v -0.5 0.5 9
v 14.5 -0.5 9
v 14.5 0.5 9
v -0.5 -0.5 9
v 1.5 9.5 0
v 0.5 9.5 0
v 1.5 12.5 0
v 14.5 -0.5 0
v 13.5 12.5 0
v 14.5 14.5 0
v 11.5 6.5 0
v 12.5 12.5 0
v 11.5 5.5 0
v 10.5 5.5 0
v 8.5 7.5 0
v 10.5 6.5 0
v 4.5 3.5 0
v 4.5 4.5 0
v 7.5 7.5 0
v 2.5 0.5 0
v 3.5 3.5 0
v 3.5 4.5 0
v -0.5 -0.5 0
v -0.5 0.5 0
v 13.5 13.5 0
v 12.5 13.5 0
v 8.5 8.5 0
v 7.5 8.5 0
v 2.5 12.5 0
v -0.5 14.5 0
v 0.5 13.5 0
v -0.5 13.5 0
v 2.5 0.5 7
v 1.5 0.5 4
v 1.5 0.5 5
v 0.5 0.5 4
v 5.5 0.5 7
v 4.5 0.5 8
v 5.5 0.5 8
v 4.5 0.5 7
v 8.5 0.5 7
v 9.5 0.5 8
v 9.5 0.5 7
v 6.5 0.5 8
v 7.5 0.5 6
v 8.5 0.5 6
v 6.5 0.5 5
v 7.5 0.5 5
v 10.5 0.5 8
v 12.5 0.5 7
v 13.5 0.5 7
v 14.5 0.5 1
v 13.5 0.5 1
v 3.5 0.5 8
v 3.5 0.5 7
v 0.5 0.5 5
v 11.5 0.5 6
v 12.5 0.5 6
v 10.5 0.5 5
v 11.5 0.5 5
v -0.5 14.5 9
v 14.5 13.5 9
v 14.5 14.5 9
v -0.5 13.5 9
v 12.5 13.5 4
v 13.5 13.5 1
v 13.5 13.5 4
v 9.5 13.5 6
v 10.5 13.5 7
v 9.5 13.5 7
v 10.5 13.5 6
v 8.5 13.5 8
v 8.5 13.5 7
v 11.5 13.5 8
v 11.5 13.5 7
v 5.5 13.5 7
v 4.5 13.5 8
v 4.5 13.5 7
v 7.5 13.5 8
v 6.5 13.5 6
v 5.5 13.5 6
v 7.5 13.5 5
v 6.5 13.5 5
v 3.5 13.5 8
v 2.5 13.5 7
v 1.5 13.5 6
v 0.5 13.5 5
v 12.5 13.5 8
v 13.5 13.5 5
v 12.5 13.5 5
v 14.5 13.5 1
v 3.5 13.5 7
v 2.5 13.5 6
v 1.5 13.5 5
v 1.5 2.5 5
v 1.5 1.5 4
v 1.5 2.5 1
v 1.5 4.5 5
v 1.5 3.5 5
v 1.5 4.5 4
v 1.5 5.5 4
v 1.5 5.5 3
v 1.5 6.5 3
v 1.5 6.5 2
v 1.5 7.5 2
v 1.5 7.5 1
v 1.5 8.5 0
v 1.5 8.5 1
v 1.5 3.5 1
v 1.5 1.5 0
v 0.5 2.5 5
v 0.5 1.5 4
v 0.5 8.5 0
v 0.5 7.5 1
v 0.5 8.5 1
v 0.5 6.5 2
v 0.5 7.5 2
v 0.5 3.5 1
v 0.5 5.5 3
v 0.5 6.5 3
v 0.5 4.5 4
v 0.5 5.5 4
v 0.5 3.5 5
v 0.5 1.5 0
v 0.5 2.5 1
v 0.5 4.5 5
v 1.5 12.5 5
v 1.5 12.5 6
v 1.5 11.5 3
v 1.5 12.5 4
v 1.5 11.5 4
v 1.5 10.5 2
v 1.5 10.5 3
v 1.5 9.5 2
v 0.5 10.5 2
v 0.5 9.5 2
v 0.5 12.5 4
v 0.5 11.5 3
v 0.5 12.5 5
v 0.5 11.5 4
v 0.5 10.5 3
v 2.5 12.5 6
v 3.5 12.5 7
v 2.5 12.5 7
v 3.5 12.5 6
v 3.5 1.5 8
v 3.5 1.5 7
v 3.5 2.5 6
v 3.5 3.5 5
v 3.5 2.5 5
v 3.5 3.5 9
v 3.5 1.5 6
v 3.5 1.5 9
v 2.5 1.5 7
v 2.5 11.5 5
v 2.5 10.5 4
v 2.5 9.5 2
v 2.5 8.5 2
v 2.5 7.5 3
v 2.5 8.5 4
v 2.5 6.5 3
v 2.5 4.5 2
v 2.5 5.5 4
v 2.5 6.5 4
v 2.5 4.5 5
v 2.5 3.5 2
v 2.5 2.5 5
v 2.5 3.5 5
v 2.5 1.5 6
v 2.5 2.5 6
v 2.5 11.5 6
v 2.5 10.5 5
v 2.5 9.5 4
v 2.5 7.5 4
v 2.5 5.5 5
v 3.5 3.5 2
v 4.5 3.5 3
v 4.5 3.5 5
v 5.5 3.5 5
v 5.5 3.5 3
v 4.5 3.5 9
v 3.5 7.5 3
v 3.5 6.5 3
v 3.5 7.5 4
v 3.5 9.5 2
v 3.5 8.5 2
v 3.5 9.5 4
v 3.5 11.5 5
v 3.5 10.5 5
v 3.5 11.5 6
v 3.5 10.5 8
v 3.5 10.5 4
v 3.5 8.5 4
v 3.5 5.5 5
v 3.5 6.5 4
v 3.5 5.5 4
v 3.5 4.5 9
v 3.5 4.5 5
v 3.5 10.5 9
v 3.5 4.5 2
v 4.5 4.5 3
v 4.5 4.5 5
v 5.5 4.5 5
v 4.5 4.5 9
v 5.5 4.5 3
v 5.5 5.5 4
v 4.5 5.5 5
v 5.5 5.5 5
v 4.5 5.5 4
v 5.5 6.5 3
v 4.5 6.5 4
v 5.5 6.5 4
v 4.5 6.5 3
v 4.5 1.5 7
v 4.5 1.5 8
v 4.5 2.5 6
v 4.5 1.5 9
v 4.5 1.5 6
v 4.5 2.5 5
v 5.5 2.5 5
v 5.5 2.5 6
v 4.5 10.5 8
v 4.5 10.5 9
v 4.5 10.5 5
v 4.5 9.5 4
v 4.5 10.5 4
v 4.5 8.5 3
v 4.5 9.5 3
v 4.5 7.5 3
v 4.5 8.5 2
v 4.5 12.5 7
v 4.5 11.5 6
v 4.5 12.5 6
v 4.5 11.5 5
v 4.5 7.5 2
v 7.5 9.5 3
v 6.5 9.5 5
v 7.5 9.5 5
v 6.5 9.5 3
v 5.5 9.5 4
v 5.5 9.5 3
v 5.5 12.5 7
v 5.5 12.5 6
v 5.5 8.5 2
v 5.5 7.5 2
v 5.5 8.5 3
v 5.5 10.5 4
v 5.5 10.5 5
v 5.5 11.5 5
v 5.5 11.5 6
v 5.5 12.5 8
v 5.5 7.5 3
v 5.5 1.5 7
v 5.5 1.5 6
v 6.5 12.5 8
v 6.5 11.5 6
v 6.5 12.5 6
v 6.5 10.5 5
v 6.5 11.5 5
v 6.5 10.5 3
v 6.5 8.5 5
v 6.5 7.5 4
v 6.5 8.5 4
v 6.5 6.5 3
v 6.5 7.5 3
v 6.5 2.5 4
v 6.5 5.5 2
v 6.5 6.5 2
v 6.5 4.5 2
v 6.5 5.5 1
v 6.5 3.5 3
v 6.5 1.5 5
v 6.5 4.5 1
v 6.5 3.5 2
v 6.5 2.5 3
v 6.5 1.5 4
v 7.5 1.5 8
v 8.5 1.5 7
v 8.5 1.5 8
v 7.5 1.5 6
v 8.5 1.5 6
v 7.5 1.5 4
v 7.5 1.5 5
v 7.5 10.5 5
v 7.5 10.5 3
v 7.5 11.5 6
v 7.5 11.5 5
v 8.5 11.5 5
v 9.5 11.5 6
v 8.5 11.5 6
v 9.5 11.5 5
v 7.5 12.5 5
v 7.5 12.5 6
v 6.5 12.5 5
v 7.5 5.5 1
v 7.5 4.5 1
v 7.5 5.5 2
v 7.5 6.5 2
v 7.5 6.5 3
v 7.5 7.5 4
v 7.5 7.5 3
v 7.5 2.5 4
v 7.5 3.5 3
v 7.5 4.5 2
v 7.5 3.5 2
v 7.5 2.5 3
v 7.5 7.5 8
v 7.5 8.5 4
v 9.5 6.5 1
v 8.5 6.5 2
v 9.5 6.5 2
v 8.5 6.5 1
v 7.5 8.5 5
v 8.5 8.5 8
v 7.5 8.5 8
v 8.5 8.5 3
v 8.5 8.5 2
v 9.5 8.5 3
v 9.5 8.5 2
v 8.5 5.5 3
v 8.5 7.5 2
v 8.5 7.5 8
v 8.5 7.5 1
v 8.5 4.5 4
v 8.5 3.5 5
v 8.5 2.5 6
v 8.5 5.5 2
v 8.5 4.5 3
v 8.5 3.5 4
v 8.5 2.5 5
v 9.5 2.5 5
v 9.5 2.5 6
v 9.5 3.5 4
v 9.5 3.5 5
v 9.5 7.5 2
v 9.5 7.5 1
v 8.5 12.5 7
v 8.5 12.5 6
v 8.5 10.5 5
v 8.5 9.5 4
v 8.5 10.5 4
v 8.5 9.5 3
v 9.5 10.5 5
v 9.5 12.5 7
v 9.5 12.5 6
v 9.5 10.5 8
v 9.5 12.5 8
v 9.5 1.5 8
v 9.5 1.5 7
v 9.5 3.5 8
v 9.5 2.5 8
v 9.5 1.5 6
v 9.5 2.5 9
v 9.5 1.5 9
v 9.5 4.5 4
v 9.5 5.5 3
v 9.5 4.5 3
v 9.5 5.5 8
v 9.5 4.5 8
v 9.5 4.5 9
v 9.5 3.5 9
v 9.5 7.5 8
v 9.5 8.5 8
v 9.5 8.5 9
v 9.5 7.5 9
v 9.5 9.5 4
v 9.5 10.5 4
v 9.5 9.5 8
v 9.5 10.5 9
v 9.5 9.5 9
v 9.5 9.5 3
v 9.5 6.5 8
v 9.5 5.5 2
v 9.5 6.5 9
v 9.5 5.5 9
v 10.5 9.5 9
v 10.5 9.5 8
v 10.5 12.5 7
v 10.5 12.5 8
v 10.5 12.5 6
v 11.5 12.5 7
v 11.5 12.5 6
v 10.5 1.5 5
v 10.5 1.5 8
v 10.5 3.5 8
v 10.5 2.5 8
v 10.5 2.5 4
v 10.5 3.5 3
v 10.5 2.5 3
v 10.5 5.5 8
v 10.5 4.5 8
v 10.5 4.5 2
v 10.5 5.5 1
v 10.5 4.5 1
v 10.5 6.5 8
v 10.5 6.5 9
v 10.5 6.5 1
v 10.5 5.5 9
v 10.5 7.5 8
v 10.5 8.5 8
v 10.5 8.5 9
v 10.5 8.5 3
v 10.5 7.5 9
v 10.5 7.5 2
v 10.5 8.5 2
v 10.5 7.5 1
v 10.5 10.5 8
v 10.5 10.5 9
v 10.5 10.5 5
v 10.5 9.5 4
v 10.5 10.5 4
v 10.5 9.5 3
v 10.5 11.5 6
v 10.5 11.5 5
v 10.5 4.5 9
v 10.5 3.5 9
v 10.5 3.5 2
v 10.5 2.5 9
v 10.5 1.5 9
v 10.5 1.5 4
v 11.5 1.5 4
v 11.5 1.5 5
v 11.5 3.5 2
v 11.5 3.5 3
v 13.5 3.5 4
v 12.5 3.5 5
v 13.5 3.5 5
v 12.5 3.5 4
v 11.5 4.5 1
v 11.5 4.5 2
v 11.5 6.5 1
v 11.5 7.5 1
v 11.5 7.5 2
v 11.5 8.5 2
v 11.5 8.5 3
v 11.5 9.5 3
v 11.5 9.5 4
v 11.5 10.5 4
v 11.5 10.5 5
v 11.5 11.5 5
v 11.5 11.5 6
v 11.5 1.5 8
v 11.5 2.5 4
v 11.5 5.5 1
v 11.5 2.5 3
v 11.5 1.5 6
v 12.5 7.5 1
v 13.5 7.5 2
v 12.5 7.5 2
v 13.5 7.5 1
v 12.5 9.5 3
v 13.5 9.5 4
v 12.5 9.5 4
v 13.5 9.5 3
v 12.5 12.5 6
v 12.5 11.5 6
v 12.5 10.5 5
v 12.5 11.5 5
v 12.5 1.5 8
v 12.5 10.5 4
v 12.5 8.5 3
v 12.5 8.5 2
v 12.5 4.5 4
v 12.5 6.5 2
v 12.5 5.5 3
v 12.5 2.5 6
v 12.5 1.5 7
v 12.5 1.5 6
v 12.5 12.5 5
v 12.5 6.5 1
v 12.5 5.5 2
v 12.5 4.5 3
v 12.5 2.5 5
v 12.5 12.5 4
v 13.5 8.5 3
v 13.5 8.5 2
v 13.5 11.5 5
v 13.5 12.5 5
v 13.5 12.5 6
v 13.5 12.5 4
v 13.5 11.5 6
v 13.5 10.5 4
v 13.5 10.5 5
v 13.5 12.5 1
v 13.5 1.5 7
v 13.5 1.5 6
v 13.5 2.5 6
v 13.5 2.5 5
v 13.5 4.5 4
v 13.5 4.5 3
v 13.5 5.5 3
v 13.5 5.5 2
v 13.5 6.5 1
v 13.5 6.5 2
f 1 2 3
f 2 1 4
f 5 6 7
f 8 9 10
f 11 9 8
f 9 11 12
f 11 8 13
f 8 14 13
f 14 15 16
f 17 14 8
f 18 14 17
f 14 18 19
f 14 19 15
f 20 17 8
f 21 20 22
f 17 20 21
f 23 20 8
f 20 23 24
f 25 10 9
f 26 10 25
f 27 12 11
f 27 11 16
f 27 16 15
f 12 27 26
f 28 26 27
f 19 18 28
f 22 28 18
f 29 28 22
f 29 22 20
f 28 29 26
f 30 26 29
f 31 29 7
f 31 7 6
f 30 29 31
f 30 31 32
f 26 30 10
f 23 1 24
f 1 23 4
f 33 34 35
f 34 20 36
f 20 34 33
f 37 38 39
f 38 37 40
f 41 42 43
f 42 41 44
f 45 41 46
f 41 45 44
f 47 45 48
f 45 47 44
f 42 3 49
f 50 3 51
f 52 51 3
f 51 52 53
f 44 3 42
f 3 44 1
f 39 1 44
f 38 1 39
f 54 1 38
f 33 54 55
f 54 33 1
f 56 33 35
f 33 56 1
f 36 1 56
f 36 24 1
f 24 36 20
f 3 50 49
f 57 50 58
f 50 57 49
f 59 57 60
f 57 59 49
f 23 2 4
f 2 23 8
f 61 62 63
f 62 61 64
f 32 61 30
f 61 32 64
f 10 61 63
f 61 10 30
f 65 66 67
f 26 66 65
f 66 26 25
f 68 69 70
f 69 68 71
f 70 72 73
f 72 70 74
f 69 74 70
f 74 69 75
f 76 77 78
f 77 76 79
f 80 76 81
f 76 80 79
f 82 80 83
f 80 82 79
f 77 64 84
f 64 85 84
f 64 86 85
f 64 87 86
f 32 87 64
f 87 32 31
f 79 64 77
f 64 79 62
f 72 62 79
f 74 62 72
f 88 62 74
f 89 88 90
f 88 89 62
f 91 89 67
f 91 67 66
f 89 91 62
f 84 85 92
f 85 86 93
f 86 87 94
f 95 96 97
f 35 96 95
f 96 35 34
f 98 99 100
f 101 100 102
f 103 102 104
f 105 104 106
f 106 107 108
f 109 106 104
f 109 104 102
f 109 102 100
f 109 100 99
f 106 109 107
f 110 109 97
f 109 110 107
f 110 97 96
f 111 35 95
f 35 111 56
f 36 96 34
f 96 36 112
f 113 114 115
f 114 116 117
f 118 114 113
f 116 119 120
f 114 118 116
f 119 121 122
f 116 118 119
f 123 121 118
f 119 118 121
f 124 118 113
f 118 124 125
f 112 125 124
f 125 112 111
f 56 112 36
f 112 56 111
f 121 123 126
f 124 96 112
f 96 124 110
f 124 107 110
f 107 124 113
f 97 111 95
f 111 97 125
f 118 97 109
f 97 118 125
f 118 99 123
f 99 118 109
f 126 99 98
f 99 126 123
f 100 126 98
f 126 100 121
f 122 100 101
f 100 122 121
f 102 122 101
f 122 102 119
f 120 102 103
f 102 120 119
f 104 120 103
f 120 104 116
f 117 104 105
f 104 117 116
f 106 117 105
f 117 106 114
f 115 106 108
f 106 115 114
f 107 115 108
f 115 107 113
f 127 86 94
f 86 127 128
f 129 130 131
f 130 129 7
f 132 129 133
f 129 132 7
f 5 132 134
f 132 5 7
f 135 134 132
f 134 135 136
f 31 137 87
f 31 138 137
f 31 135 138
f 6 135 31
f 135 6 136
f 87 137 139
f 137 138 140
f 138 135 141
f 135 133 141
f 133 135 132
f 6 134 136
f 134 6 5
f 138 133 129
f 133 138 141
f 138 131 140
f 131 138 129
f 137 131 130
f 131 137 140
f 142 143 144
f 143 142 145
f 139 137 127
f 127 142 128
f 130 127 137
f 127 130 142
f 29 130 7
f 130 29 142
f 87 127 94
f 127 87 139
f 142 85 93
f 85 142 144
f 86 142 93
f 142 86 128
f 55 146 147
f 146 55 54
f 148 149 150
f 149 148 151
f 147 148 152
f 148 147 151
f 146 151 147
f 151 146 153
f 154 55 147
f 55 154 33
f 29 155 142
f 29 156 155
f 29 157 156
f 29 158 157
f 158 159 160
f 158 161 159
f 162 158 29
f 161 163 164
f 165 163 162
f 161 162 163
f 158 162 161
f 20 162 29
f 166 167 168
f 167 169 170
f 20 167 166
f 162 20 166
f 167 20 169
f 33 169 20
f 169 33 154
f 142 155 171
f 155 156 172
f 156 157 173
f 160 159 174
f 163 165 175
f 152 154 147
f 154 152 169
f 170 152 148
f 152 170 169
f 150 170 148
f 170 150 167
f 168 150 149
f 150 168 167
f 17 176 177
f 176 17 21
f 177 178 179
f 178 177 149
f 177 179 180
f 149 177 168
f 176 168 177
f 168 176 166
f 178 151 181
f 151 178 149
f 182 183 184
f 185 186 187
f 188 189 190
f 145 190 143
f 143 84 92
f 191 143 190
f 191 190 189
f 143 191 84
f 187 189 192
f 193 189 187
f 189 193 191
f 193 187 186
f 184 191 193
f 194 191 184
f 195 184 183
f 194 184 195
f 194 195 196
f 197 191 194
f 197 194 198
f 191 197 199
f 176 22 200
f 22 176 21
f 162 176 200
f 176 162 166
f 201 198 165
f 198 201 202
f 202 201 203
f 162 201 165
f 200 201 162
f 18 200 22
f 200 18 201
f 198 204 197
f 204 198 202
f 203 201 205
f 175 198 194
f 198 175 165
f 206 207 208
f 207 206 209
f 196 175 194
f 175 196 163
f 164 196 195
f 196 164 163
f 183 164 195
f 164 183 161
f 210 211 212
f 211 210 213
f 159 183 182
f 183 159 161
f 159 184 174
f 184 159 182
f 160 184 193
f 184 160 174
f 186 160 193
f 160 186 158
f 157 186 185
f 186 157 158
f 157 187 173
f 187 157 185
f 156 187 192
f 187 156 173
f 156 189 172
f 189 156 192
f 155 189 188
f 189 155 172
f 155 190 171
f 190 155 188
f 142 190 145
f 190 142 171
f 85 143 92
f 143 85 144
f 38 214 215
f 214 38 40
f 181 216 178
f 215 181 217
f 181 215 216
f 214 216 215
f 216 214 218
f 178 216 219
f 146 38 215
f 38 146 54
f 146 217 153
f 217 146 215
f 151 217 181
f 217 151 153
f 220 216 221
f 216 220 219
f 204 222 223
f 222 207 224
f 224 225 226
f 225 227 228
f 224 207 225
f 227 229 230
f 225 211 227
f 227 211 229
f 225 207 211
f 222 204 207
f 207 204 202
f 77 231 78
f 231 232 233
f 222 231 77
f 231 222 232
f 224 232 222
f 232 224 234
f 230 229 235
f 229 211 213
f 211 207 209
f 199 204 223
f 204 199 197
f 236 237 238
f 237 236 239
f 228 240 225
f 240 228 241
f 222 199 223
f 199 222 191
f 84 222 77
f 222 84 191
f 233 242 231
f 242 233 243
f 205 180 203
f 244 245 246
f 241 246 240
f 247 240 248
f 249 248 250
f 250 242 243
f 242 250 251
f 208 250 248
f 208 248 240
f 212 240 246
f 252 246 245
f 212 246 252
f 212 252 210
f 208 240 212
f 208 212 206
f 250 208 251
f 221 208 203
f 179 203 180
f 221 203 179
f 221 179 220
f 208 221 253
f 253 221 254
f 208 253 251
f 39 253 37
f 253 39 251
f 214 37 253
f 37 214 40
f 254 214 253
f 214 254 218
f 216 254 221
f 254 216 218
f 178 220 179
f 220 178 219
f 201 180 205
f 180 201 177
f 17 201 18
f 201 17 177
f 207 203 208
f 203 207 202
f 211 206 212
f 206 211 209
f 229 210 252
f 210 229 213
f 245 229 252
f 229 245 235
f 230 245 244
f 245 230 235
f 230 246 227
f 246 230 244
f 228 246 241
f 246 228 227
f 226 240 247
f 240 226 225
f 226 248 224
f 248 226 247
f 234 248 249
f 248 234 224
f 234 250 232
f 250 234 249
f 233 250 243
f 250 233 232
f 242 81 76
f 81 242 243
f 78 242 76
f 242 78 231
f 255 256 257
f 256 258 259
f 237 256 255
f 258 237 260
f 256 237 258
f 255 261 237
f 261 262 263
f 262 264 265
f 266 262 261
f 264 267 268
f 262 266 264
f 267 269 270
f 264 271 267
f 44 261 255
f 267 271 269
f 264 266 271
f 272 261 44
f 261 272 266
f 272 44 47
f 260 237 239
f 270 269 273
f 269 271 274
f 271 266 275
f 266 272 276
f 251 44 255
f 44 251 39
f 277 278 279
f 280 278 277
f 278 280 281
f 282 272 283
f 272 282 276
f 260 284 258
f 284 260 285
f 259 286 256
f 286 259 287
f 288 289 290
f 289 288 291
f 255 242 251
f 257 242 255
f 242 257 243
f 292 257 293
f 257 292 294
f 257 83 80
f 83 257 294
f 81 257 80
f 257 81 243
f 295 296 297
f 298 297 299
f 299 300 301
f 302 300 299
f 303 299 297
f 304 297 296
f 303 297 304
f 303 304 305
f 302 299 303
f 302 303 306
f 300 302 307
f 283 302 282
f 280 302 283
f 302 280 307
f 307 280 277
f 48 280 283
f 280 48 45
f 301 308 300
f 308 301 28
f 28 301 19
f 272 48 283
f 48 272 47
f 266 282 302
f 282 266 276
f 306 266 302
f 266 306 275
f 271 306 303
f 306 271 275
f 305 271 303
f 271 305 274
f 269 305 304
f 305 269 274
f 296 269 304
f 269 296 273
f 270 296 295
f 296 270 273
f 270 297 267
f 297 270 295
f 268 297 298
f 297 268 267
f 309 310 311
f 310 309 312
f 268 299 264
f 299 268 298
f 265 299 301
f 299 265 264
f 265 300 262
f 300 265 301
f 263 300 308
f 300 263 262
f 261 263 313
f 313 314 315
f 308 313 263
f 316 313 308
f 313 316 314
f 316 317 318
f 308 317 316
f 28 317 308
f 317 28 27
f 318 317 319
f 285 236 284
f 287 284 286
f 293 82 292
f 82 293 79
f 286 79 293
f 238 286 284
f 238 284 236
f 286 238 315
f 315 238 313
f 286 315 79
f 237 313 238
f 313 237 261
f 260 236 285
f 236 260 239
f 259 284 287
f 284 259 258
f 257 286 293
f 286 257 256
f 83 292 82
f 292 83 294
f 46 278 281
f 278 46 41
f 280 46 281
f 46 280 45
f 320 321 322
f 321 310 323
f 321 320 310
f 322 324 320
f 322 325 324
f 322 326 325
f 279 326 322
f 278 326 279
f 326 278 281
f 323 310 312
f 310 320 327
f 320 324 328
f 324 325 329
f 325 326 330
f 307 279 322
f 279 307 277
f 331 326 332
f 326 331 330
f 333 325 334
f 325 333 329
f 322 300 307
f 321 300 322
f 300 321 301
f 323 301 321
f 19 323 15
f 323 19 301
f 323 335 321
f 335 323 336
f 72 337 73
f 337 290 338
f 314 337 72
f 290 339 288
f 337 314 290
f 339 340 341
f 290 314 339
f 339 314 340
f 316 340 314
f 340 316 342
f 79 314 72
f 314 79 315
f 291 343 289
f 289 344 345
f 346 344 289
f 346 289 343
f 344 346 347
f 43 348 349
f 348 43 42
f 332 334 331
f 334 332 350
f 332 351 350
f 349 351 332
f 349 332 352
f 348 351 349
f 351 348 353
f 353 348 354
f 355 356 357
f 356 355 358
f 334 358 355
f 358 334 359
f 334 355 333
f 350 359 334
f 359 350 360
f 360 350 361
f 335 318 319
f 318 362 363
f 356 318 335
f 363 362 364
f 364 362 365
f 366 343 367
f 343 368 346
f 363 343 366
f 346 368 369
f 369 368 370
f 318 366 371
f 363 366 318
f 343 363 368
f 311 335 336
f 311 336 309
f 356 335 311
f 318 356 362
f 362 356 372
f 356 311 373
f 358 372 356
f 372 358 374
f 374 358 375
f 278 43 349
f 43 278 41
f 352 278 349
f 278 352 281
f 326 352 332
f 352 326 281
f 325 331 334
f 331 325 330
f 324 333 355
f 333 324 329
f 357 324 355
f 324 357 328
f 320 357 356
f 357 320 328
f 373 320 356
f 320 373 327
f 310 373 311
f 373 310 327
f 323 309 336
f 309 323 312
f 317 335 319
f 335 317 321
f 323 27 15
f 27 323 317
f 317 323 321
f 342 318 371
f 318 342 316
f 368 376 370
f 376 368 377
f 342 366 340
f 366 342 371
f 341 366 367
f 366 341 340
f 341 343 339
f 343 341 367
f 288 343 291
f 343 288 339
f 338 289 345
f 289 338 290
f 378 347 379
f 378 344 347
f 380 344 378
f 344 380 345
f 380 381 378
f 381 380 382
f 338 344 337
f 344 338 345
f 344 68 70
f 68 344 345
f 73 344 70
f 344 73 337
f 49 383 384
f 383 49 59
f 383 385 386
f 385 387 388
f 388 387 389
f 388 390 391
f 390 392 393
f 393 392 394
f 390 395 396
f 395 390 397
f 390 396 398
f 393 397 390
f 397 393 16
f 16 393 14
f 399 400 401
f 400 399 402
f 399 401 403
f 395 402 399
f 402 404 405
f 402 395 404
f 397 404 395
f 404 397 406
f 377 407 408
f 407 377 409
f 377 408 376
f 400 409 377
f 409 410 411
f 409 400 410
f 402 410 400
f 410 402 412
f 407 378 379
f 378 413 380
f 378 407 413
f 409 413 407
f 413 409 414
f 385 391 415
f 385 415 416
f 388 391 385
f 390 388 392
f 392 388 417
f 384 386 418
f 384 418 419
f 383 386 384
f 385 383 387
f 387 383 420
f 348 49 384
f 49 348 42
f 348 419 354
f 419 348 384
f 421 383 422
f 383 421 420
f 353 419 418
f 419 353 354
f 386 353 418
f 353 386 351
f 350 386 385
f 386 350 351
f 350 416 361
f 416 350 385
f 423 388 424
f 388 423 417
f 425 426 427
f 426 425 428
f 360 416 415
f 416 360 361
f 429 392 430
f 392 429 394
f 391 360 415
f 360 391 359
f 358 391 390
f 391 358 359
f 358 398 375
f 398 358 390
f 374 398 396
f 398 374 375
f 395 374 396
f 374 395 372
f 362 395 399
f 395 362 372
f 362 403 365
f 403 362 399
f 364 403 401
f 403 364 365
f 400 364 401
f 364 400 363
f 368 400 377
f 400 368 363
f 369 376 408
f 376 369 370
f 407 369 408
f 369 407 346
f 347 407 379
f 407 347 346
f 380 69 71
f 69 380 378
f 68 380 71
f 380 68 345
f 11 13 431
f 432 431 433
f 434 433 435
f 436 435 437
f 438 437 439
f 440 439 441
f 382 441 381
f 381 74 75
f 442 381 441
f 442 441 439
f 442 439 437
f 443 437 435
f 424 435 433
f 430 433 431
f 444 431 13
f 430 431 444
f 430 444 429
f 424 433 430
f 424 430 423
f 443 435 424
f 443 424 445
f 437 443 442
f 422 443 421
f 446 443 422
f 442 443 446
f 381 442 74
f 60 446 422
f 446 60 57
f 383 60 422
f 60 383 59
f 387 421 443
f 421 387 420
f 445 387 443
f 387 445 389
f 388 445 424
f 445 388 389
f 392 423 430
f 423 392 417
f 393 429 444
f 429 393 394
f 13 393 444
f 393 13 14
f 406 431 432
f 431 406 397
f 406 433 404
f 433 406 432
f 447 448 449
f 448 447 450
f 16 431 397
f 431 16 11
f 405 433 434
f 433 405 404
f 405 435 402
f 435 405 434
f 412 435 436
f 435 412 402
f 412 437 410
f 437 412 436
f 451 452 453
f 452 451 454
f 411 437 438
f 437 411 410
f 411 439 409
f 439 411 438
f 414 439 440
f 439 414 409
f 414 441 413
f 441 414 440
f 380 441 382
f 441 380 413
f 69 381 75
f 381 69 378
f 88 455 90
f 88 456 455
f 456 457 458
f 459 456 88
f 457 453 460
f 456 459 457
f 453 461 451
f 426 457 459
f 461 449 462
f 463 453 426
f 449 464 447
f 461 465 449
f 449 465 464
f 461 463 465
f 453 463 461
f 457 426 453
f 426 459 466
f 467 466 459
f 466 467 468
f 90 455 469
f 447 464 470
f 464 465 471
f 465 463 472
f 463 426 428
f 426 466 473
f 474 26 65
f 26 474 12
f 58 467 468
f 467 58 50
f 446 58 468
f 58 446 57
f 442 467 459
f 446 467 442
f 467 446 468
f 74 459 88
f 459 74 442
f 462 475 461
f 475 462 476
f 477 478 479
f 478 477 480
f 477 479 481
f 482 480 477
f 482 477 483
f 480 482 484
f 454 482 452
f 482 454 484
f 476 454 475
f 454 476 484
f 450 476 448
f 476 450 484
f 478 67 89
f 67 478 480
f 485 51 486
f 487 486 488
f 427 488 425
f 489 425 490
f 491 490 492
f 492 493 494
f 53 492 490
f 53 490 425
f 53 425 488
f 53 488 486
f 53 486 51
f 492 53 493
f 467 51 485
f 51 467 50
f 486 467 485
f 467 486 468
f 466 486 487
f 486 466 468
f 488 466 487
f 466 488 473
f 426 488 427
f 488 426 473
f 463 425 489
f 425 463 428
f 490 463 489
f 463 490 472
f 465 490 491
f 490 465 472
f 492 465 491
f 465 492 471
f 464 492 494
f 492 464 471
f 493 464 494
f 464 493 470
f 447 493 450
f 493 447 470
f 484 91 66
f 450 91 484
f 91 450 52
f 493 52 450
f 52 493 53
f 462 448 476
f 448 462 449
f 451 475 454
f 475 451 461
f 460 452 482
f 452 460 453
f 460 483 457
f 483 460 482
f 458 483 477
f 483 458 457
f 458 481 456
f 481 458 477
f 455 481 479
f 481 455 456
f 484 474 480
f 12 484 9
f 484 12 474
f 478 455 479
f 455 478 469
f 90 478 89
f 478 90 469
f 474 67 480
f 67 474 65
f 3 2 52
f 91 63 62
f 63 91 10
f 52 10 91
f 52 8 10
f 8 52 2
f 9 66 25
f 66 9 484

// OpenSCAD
union() {
    translate([0, 0, 4.5]) cube([1, 1, 9], center=true);
    translate([0, 14, 4.5]) cube([1, 1, 9], center=true);
    translate([1, 0, 4.5]) cube([1, 1, 9], center=true);
    translate([1, 1, 4.5]) color([1, 0, 0]) cube([1, 1, 1], center=true);
    translate([1, 2, 2.5]) cube([1, 1, 5], center=true);
    translate([1, 3, 0.5]) cube([1, 1, 1], center=true);
    translate([1, 4, 2.5]) cube([1, 1, 5], center=true);
    translate([1, 5, 2.0]) cube([1, 1, 4], center=true);
    translate([1, 6, 1.5]) cube([1, 1, 3], center=true);
    translate([1, 7, 1.0]) cube([1, 1, 2], center=true);
    translate([1, 8, 0.5]) cube([1, 1, 1], center=true);
    translate([1, 10, 1.0]) cube([1, 1, 2], center=true);
    translate([1, 11, 1.5]) cube([1, 1, 3], center=true);
    translate([1, 12, 2.0]) cube([1, 1, 4], center=true);
    translate([1, 13, 2.5]) cube([1, 1, 5], center=true);
    translate([1, 14, 4.5]) cube([1, 1, 9], center=true);
    translate([2, 0, 4.5]) cube([1, 1, 9], center=true);
    translate([2, 13, 3.0]) cube([1, 1, 6], center=true);
    translate([2, 14, 4.5]) cube([1, 1, 9], center=true);
    translate([3, 0, 4.5]) cube([1, 1, 9], center=true);
    translate([3, 1, 3.5]) cube([1, 1, 7], center=true);
    translate([3, 2, 3.0]) cube([1, 1, 6], center=true);
    translate([3, 3, 2.5]) cube([1, 1, 5], center=true);
    translate([3, 4, 1.0]) cube([1, 1, 2], center=true);
    translate([3, 5, 2.5]) cube([1, 1, 5], center=true);
    translate([3, 6, 2.0]) cube([1, 1, 4], center=true);
    translate([3, 7, 1.5]) cube([1, 1, 3], center=true);
    translate([3, 8, 2.0]) cube([1, 1, 4], center=true);
    translate([3, 9, 1.0]) cube([1, 1, 2], center=true);
    translate([3, 10, 2.0]) cube([1, 1, 4], center=true);
    translate([3, 11, 2.5]) cube([1, 1, 5], center=true);
    translate([3, 12, 3.0]) cube([1, 1, 6], center=true);
    translate([3, 13, 3.5]) cube([1, 1, 7], center=true);
    translate([3, 14, 4.5]) cube([1, 1, 9], center=true);
    translate([4, 0, 4.5]) cube([1, 1, 9], center=true);
    translate([4, 1, 4.0]) cube([1, 1, 8], center=true);
    translate([4, 2, 4.5]) cube([1, 1, 9], center=true);
    translate([4, 3, 4.5]) cube([1, 1, 9], center=true);
    translate([4, 5, 4.5]) cube([1, 1, 9], center=true);
    translate([4, 6, 4.5]) cube([1, 1, 9], center=true);
    translate([4, 7, 4.5]) cube([1, 1, 9], center=true);
    translate([4, 8, 4.5]) cube([1, 1, 9], center=true);
    translate([4, 9, 4.5]) cube([1, 1, 9], center=true);
    translate([4, 10, 4.5]) cube([1, 1, 9], center=true);
    translate([4, 11, 4.0]) cube([1, 1, 8], center=true);
    translate([4, 12, 4.0]) cube([1, 1, 8], center=true);
    translate([4, 13, 4.0]) cube([1, 1, 8], center=true);
    translate([4, 14, 4.5]) cube([1, 1, 9], center=true);
    translate([5, 0, 4.5]) cube([1, 1, 9], center=true);
    translate([5, 1, 3.5]) cube([1, 1, 7], center=true);
    translate([5, 2, 3.0]) cube([1, 1, 6], center=true);
    translate([5, 3, 2.5]) cube([1, 1, 5], center=true);
    translate([5, 4, 1.5]) cube([1, 1, 3], center=true);
    translate([5, 5, 2.5]) cube([1, 1, 5], center=true);
    translate([5, 6, 2.0]) cube([1, 1, 4], center=true);
    translate([5, 7, 1.5]) cube([1, 1, 3], center=true);
    translate([5, 8, 1.0]) cube([1, 1, 2], center=true);
    translate([5, 9, 1.5]) cube([1, 1, 3], center=true);
    translate([5, 10, 2.0]) cube([1, 1, 4], center=true);
    translate([5, 11, 2.5]) cube([1, 1, 5], center=true);
    translate([5, 12, 3.0]) cube([1, 1, 6], center=true);
    translate([5, 13, 3.5]) cube([1, 1, 7], center=true);
    translate([5, 14, 4.5]) cube([1, 1, 9], center=true);
    translate([6, 0, 4.5]) cube([1, 1, 9], center=true);
    translate([6, 1, 4.0]) cube([1, 1, 8], center=true);
    translate([6, 2, 4.0]) cube([1, 1, 8], center=true);
    translate([6, 3, 4.0]) cube([1, 1, 8], center=true);
    translate([6, 4, 4.0]) cube([1, 1, 8], center=true);
    translate([6, 5, 4.0]) cube([1, 1, 8], center=true);
    translate([6, 6, 4.0]) cube([1, 1, 8], center=true);
    translate([6, 7, 4.0]) cube([1, 1, 8], center=true);
    translate([6, 8, 4.0]) cube([1, 1, 8], center=true);
    translate([6, 9, 4.0]) cube([1, 1, 8], center=true);
    translate([6, 10, 4.0]) cube([1, 1, 8], center=true);
    translate([6, 11, 4.0]) cube([1, 1, 8], center=true);
    translate([6, 12, 4.0]) cube([1, 1, 8], center=true);
    translate([6, 13, 3.0]) cube([1, 1, 6], center=true);
    translate([6, 14, 4.5]) cube([1, 1, 9], center=true);
    translate([7, 0, 4.5]) cube([1, 1, 9], center=true);
    translate([7, 1, 2.5]) cube([1, 1, 5], center=true);
    translate([7, 2, 2.0]) cube([1, 1, 4], center=true);
    translate([7, 3, 1.5]) cube([1, 1, 3], center=true);
    translate([7, 4, 1.0]) cube([1, 1, 2], center=true);
    translate([7, 5, 0.5]) cube([1, 1, 1], center=true);
    translate([7, 6, 1.0]) cube([1, 1, 2], center=true);
    translate([7, 7, 1.5]) cube([1, 1, 3], center=true);
    translate([7, 8, 2.0]) cube([1, 1, 4], center=true);
    translate([7, 9, 2.5]) cube([1, 1, 5], center=true);
    translate([7, 10, 1.5]) cube([1, 1, 3], center=true);
    translate([7, 11, 2.5]) cube([1, 1, 5], center=true);
    translate([7, 12, 3.0]) cube([1, 1, 6], center=true);
    translate([7, 13, 2.5]) cube([1, 1, 5], center=true);
    translate([7, 14, 4.5]) cube([1, 1, 9], center=true);
    translate([8, 0, 4.5]) cube([1, 1, 9], center=true);
    translate([8, 1, 3.0]) cube([1, 1, 6], center=true);
    translate([8, 2, 4.0]) cube([1, 1, 8], center=true);
    translate([8, 3, 4.0]) cube([1, 1, 8], center=true);
    translate([8, 4, 4.0]) cube([1, 1, 8], center=true);
    translate([8, 5, 4.0]) cube([1, 1, 8], center=true);
    translate([8, 6, 4.0]) cube([1, 1, 8], center=true);
    translate([8, 7, 4.0]) cube([1, 1, 8], center=true);
    translate([8, 9, 4.0]) cube([1, 1, 8], center=true);
    translate([8, 10, 4.0]) cube([1, 1, 8], center=true);
    translate([8, 11, 4.0]) cube([1, 1, 8], center=true);
    translate([8, 12, 4.0]) cube([1, 1, 8], center=true);
    translate([8, 13, 4.0]) cube([1, 1, 8], center=true);
    translate([8, 14, 4.5]) cube([1, 1, 9], center=true);
    translate([9, 0, 4.5]) cube([1, 1, 9], center=true);
    translate([9, 1, 3.5]) cube([1, 1, 7], center=true);
    translate([9, 2, 3.0]) cube([1, 1, 6], center=true);
    translate([9, 3, 2.5]) cube([1, 1, 5], center=true);
    translate([9, 4, 2.0]) cube([1, 1, 4], center=true);
    translate([9, 5, 1.5]) cube([1, 1, 3], center=true);
    translate([9, 6, 1.0]) cube([1, 1, 2], center=true);
    translate([9, 7, 0.5]) cube([1, 1, 1], center=true);
    translate([9, 8, 1.0]) cube([1, 1, 2], center=true);
    translate([9, 9, 1.5]) cube([1, 1, 3], center=true);
    translate([9, 10, 2.0]) cube([1, 1, 4], center=true);
    translate([9, 11, 2.5]) cube([1, 1, 5], center=true);
    translate([9, 12, 3.0]) cube([1, 1, 6], center=true);
    translate([9, 13, 3.5]) cube([1, 1, 7], center=true);
    translate([9, 14, 4.5]) cube([1, 1, 9], center=true);
    translate([10, 0, 4.5]) cube([1, 1, 9], center=true);
    translate([10, 1, 4.0]) cube([1, 1, 8], center=true);
    translate([10, 2, 4.5]) cube([1, 1, 9], center=true);
    translate([10, 3, 4.0]) cube([1, 1, 8], center=true);
    translate([10, 4, 4.5]) cube([1, 1, 9], center=true);
    translate([10, 5, 4.0]) cube([1, 1, 8], center=true);
    translate([10, 6, 4.5]) cube([1, 1, 9], center=true);
    translate([10, 7, 4.0]) cube([1, 1, 8], center=true);
    translate([10, 8, 4.5]) cube([1, 1, 9], center=true);
    translate([10, 9, 4.0]) cube([1, 1, 8], center=true);
    translate([10, 10, 4.5]) cube([1, 1, 9], center=true);
    translate([10, 11, 4.0]) cube([1, 1, 8], center=true);
    translate([10, 12, 4.0]) cube([1, 1, 8], center=true);
    translate([10, 13, 3.0]) cube([1, 1, 6], center=true);
    translate([10, 14, 4.5]) cube([1, 1, 9], center=true);
    translate([11, 0, 4.5]) cube([1, 1, 9], center=true);
    translate([11, 1, 2.5]) cube([1, 1, 5], center=true);
    translate([11, 2, 2.0]) cube([1, 1, 4], center=true);
    translate([11, 3, 1.5]) cube([1, 1, 3], center=true);
    translate([11, 4, 1.0]) cube([1, 1, 2], center=true);
    translate([11, 5, 0.5]) cube([1, 1, 1], center=true);
    translate([11, 7, 0.5]) cube([1, 1, 1], center=true);
    translate([11, 8, 1.0]) cube([1, 1, 2], center=true);
    translate([11, 9, 1.5]) cube([1, 1, 3], center=true);
    translate([11, 10, 2.0]) cube([1, 1, 4], center=true);
    translate([11, 11, 2.5]) cube([1, 1, 5], center=true);
    translate([11, 12, 3.0]) cube([1, 1, 6], center=true);
    translate([11, 13, 3.5]) cube([1, 1, 7], center=true);
    translate([11, 14, 4.5]) cube([1, 1, 9], center=true);
    translate([12, 0, 4.5]) cube([1, 1, 9], center=true);
    translate([12, 1, 3.0]) cube([1, 1, 6], center=true);
    translate([12, 2, 4.0]) cube([1, 1, 8], center=true);
    translate([12, 3, 4.0]) cube([1, 1, 8], center=true);
    translate([12, 4, 4.0]) cube([1, 1, 8], center=true);
    translate([12, 5, 4.0]) cube([1, 1, 8], center=true);
    translate([12, 6, 4.0]) cube([1, 1, 8], center=true);
    translate([12, 7, 4.0]) cube([1, 1, 8], center=true);
    translate([12, 8, 4.0]) cube([1, 1, 8], center=true);
    translate([12, 9, 4.0]) cube([1, 1, 8], center=true);
    translate([12, 10, 4.0]) cube([1, 1, 8], center=true);
    translate([12, 11, 4.0]) cube([1, 1, 8], center=true);
    translate([12, 12, 4.0]) cube([1, 1, 8], center=true);
    translate([12, 13, 4.0]) cube([1, 1, 8], center=true);
    translate([12, 14, 4.5]) cube([1, 1, 9], center=true);
    translate([13, 0, 4.5]) cube([1, 1, 9], center=true);
    translate([13, 1, 3.5]) cube([1, 1, 7], center=true);
    translate([13, 2, 3.0]) cube([1, 1, 6], center=true);
    translate([13, 3, 2.5]) cube([1, 1, 5], center=true);
    translate([13, 4, 2.0]) cube([1, 1, 4], center=true);
    translate([13, 5, 1.5]) cube([1, 1, 3], center=true);
    translate([13, 6, 1.0]) cube([1, 1, 2], center=true);
    translate([13, 7, 0.5]) cube([1, 1, 1], center=true);
    translate([13, 8, 1.0]) cube([1, 1, 2], center=true);
    translate([13, 9, 1.5]) cube([1, 1, 3], center=true);
    translate([13, 10, 2.0]) cube([1, 1, 4], center=true);
    translate([13, 11, 2.5]) cube([1, 1, 5], center=true);
    translate([13, 12, 3.0]) cube([1, 1, 6], center=true);
    translate([13, 13, 4.5]) color([0, 0, 1]) cube([1, 1, 1], center=true);
    translate([13, 14, 4.5]) cube([1, 1, 9], center=true);
    translate([14, 0, 4.5]) cube([1, 1, 9], center=true);
    translate([14, 1, 0.5]) cube([1, 1, 1], center=true);
    translate([14, 2, 0.5]) cube([1, 1, 1], center=true);
    translate([14, 3, 0.5]) cube([1, 1, 1], center=true);
    translate([14, 4, 0.5]) cube([1, 1, 1], center=true);
    translate([14, 5, 0.5]) cube([1, 1, 1], center=true);
    translate([14, 6, 0.5]) cube([1, 1, 1], center=true);
    translate([14, 7, 0.5]) cube([1, 1, 1], center=true);
    translate([14, 8, 0.5]) cube([1, 1, 1], center=true);
    translate([14, 9, 0.5]) cube([1, 1, 1], center=true);
    translate([14, 10, 0.5]) cube([1, 1, 1], center=true);
    translate([14, 11, 0.5]) cube([1, 1, 1], center=true);
    translate([14, 12, 0.5]) cube([1, 1, 1], center=true);
    translate([14, 13, 0.5]) cube([1, 1, 1], center=true);
    translate([14, 14, 4.5]) cube([1, 1, 9], center=true);
}
